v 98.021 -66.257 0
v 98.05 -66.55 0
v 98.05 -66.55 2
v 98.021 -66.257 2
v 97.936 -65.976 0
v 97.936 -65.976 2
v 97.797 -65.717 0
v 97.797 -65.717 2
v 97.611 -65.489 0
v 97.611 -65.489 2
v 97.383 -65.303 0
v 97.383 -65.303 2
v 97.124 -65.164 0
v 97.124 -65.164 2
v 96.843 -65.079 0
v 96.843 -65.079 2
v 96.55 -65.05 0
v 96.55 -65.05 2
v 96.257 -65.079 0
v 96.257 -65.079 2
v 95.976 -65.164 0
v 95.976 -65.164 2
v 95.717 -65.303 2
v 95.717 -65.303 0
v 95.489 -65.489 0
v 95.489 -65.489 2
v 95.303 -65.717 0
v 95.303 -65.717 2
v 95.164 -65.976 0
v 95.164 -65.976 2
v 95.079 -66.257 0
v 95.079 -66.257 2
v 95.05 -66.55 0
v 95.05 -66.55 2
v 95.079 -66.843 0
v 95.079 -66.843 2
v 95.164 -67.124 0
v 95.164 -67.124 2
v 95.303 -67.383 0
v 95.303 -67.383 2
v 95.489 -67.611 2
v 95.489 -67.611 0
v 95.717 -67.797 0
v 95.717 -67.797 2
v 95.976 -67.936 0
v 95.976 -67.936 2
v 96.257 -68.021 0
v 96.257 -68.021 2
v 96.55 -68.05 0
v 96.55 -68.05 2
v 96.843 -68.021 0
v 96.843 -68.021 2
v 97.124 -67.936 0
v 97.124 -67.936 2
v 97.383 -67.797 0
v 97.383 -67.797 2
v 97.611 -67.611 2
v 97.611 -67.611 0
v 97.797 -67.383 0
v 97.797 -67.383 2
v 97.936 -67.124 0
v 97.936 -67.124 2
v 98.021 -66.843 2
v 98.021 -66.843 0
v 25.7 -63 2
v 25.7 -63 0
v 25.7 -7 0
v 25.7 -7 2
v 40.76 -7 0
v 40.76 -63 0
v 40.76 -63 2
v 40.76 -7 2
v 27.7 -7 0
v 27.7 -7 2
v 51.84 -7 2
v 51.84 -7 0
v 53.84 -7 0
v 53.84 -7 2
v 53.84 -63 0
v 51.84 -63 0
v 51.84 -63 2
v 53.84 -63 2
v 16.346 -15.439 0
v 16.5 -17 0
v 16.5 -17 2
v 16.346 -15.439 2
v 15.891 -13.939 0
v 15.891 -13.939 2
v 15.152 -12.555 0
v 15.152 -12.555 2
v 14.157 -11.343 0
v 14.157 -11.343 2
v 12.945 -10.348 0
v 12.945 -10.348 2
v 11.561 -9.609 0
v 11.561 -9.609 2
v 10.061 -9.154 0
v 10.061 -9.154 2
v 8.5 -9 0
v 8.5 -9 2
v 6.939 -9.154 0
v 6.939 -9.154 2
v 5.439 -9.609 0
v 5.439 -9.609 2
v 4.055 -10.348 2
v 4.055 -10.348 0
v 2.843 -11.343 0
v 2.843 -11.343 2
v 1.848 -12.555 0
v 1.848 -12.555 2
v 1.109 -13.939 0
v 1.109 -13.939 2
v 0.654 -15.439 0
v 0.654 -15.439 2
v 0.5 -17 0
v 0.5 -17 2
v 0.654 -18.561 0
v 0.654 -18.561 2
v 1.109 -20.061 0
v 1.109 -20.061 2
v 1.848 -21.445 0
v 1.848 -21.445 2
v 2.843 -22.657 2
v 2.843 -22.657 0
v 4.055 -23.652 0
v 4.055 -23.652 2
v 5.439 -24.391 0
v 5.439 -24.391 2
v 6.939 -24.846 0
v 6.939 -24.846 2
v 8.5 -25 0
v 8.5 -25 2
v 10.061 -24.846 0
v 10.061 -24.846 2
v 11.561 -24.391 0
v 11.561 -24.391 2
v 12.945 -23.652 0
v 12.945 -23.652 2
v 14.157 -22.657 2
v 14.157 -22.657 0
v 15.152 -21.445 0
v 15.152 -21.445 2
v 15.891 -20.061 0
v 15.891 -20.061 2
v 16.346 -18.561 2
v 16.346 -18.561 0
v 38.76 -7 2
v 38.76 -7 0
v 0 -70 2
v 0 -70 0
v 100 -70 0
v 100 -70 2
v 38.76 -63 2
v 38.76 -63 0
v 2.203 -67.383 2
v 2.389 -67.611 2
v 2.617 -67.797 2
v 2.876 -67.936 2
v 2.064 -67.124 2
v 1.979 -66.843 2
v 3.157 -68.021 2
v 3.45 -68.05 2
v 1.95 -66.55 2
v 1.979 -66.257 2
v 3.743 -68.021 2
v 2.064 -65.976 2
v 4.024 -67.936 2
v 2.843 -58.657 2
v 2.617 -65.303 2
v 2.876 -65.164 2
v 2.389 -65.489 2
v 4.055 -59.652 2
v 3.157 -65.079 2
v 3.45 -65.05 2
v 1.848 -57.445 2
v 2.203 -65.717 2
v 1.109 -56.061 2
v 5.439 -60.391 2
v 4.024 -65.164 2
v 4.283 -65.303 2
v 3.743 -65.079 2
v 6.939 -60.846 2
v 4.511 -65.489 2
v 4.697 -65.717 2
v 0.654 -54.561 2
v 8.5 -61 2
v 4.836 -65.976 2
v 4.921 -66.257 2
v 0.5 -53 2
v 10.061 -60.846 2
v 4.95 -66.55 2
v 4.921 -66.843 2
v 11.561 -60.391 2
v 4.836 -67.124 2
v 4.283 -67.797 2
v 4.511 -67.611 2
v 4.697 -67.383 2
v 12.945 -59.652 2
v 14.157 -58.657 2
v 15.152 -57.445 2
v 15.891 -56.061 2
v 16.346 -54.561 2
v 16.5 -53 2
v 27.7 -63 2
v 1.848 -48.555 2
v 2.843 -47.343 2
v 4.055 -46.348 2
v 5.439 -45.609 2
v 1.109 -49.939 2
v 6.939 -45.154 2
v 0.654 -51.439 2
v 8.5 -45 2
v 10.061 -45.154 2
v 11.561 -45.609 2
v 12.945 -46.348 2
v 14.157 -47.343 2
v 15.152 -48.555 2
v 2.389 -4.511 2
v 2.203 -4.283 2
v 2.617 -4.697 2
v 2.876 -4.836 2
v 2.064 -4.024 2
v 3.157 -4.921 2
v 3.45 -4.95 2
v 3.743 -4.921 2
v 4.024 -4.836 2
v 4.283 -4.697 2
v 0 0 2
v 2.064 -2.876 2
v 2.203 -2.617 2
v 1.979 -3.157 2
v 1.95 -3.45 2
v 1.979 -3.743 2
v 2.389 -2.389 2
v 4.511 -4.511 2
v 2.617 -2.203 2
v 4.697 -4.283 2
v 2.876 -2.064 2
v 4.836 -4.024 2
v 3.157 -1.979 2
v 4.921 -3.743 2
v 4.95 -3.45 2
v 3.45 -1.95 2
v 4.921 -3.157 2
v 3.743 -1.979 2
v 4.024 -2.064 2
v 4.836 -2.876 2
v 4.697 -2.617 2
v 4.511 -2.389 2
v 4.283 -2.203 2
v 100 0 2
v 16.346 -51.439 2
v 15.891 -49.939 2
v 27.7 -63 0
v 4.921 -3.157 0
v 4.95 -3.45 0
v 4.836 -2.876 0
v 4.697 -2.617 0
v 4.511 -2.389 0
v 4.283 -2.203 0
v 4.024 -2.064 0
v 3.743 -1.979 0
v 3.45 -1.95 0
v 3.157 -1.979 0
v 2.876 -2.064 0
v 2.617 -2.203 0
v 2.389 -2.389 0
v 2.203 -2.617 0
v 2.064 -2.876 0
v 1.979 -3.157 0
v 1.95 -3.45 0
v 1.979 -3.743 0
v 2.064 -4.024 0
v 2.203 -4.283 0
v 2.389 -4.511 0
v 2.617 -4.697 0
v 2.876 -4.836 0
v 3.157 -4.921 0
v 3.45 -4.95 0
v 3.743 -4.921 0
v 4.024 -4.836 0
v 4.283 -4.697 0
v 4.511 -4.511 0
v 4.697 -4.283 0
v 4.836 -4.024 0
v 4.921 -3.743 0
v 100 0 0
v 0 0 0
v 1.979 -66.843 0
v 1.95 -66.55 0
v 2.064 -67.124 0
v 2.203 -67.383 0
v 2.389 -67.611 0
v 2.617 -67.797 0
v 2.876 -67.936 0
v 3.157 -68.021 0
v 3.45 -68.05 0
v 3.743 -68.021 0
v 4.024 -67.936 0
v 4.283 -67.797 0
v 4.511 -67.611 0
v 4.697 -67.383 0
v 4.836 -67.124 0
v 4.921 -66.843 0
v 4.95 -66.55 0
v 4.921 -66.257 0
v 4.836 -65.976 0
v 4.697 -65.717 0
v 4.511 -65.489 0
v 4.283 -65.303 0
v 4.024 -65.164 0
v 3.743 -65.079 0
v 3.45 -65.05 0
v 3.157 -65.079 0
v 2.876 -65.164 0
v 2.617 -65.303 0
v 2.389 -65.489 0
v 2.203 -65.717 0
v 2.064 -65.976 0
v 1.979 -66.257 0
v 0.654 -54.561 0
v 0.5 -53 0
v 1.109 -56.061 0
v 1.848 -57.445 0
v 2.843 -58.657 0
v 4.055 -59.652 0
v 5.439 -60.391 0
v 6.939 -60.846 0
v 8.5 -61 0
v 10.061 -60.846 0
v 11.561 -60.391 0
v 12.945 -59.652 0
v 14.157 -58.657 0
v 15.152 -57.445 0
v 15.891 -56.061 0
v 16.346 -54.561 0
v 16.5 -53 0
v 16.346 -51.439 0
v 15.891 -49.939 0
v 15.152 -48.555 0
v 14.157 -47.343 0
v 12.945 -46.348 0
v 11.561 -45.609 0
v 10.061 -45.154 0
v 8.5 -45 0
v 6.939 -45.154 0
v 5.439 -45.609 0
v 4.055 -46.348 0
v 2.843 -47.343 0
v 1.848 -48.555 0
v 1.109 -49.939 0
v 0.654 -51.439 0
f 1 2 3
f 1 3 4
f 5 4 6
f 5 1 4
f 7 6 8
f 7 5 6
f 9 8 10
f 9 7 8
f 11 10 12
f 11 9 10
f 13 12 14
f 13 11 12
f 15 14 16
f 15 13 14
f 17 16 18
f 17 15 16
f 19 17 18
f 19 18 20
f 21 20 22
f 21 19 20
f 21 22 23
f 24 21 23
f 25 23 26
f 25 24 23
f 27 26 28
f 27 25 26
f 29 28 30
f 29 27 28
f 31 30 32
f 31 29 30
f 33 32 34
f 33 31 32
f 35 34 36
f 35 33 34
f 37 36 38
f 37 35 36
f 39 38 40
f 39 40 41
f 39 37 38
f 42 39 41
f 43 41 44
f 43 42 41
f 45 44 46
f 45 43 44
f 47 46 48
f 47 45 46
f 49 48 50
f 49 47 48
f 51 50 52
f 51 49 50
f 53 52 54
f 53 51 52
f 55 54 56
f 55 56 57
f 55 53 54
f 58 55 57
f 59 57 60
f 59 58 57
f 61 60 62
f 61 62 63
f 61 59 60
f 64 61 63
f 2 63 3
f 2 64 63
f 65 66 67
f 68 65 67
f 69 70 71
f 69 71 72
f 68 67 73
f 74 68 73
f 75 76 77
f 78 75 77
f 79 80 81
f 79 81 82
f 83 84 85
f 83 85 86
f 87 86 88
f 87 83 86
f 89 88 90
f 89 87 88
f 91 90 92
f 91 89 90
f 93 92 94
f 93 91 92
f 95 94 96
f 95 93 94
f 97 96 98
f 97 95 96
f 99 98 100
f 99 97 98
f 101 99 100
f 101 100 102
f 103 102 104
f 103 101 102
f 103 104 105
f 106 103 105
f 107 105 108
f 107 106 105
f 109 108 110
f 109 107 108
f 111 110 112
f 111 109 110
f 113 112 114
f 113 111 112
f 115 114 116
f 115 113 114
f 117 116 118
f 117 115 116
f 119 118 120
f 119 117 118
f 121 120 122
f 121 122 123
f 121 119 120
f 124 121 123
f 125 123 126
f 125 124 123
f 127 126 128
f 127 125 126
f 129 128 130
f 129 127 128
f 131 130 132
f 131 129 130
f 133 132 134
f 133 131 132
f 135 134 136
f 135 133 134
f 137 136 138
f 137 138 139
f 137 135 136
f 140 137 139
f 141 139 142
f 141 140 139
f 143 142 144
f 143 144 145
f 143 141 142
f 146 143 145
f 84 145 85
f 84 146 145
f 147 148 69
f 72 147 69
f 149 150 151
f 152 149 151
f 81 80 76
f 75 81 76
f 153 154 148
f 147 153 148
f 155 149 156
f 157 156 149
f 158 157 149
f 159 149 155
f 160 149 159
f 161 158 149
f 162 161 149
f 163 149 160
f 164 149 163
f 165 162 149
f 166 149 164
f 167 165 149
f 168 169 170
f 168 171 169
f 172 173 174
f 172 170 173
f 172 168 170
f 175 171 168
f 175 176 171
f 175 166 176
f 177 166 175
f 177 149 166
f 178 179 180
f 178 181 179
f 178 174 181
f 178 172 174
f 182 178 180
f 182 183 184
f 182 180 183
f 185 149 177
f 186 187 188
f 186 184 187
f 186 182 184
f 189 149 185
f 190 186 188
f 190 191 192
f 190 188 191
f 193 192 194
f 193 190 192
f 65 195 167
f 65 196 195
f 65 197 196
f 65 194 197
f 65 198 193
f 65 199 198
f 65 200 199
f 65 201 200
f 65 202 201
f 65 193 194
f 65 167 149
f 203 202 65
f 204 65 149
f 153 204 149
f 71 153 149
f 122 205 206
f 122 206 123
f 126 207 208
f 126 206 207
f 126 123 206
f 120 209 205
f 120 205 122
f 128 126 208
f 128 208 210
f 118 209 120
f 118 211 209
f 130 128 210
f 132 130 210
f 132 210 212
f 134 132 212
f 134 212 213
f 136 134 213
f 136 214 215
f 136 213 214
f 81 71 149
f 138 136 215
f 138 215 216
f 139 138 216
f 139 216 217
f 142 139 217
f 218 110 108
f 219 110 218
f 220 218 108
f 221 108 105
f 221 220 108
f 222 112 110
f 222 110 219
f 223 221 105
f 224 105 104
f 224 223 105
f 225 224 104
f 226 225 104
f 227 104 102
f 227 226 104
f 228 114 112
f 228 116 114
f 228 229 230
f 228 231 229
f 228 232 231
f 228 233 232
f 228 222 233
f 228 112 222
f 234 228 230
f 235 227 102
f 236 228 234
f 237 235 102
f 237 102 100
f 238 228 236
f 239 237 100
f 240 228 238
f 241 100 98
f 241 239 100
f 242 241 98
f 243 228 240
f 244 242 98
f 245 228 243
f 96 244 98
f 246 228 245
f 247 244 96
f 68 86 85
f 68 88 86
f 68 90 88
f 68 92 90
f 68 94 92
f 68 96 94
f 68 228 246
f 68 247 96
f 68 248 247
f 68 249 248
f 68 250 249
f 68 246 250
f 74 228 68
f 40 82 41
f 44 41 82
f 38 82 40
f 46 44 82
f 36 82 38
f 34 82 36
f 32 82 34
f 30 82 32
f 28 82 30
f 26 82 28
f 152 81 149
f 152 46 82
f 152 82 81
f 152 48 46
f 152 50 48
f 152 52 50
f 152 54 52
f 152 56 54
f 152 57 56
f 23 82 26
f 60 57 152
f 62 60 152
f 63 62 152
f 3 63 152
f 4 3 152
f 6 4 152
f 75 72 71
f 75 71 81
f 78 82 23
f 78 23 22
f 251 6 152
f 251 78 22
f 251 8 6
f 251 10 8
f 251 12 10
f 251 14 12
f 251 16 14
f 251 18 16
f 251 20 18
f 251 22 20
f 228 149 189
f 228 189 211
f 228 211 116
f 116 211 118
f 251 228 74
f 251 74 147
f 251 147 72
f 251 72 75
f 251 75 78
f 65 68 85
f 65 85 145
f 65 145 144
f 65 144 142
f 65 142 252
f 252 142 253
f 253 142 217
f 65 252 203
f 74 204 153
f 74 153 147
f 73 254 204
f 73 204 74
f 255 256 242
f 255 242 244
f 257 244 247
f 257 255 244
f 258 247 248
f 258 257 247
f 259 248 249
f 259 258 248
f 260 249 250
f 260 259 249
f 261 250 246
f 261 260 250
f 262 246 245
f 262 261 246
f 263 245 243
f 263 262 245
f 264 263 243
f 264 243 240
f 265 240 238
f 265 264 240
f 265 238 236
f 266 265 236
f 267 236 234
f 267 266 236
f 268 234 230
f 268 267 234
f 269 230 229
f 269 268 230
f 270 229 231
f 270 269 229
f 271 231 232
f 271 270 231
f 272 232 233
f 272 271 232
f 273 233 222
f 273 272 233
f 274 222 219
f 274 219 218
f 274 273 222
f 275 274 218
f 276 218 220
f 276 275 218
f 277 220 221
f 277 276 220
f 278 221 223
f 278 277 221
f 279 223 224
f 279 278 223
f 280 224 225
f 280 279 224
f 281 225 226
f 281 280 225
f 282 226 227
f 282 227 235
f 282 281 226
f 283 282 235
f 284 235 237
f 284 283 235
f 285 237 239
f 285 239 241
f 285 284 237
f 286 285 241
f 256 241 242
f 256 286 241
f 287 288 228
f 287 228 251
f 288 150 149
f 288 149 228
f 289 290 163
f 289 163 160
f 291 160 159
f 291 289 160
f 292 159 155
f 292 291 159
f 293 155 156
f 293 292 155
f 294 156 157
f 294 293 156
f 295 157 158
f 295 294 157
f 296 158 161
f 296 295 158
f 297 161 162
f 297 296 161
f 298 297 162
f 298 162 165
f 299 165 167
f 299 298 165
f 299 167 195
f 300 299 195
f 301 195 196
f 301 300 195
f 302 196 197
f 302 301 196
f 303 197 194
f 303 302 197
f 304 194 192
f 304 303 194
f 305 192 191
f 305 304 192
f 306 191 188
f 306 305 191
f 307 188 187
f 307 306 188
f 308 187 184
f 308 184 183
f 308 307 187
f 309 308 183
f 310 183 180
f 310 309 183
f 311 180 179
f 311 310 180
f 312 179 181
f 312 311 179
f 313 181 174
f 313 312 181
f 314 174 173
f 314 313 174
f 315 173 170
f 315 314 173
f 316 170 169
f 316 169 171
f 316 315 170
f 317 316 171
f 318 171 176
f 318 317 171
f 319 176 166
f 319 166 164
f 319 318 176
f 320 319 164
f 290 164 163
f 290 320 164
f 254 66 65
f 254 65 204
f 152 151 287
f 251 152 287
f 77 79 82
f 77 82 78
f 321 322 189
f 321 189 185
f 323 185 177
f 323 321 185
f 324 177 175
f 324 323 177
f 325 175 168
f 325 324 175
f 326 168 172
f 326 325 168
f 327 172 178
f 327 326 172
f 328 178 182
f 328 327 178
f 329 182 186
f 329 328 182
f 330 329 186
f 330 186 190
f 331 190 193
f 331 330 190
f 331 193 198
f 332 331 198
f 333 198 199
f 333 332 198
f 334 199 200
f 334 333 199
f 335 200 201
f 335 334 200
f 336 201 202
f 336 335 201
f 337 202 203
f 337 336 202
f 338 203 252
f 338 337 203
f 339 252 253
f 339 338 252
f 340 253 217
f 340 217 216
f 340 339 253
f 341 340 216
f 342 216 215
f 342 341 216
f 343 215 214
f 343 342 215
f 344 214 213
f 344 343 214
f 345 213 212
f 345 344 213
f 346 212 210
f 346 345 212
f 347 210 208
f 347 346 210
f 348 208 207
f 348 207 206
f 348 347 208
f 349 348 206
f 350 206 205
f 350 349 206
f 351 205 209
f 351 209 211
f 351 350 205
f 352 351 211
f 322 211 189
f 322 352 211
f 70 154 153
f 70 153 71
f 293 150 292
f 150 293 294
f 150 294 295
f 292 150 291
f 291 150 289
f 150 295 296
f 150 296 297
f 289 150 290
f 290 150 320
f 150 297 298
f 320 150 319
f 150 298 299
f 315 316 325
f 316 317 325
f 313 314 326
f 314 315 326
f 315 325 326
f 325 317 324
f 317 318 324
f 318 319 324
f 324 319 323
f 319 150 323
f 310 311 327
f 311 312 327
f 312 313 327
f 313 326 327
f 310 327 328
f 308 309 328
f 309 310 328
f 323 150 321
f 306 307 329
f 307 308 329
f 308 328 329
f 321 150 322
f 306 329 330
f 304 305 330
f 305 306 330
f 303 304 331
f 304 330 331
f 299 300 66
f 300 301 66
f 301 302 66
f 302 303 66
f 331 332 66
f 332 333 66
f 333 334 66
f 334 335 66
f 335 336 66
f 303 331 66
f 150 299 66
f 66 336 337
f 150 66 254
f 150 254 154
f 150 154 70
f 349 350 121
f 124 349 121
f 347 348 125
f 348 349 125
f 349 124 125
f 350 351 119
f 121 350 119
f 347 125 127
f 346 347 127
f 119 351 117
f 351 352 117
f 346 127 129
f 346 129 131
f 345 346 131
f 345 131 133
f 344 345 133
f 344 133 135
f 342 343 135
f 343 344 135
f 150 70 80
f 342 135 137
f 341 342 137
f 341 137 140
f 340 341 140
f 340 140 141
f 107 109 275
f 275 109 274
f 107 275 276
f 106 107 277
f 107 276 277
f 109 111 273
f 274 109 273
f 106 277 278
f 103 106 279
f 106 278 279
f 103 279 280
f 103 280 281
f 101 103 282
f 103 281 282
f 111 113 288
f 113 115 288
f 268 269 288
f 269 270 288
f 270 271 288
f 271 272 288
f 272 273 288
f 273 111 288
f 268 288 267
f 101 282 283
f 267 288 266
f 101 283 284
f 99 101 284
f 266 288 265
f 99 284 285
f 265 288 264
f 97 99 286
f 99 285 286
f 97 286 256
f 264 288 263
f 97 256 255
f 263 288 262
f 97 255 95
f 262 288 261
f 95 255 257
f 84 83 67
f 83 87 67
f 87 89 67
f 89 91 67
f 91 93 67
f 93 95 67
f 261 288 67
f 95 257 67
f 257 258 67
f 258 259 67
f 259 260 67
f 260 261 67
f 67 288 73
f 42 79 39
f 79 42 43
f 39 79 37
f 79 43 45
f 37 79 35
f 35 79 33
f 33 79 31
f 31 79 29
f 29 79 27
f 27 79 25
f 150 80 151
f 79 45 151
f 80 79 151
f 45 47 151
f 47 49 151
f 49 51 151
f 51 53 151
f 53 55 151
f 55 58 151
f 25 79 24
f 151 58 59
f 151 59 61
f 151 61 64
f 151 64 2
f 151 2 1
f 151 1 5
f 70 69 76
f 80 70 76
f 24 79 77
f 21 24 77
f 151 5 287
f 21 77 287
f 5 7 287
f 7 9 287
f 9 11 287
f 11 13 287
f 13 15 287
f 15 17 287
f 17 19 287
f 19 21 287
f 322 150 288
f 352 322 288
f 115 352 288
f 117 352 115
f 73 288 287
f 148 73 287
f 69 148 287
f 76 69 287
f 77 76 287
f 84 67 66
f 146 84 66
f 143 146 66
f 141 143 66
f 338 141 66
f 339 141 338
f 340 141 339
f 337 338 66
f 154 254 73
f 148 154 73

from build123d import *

# Parameters (mm, degrees)
SKETCH_1_W      = 100
SKETCH_1_H      = 70
SKETCH_1_R      = 1.5
SKETCH_1_R_2    = 8
SKETCH_1_W_2    = 2
SKETCH_1_H_2    = 56
EXTRUDE_1_DEPTH = 2


with BuildPart() as part:
    # ｽｹｯﾁ1 → ﾎﾞｽ - 押し出し1 (new body)
    with BuildSketch(Plane.XY):
        with Locations((50, -35)):
            Rectangle(SKETCH_1_W, SKETCH_1_H)
        with Locations((3.45, -3.45)):
            Circle(SKETCH_1_R, mode=Mode.SUBTRACT)
        with Locations(Location((3.45, -66.55, 0), (0, 0, 180))):
            Circle(SKETCH_1_R, mode=Mode.SUBTRACT)
        with Locations((96.55, -66.55)):
            Circle(SKETCH_1_R, mode=Mode.SUBTRACT)
        with Locations((8.5, -17)):
            Circle(SKETCH_1_R_2, mode=Mode.SUBTRACT)
        with Locations(Location((8.5, -53, 0), (0, 0, 180))):
            Circle(SKETCH_1_R_2, mode=Mode.SUBTRACT)
        with Locations((52.84, -35)):
            Rectangle(SKETCH_1_W_2, SKETCH_1_H_2, mode=Mode.SUBTRACT)
        with Locations((39.76, -35)):
            Rectangle(SKETCH_1_W_2, SKETCH_1_H_2, mode=Mode.SUBTRACT)
        with Locations((26.7, -35)):
            Rectangle(SKETCH_1_W_2, SKETCH_1_H_2, mode=Mode.SUBTRACT)
    extrude(amount=EXTRUDE_1_DEPTH)


solid = part.part
